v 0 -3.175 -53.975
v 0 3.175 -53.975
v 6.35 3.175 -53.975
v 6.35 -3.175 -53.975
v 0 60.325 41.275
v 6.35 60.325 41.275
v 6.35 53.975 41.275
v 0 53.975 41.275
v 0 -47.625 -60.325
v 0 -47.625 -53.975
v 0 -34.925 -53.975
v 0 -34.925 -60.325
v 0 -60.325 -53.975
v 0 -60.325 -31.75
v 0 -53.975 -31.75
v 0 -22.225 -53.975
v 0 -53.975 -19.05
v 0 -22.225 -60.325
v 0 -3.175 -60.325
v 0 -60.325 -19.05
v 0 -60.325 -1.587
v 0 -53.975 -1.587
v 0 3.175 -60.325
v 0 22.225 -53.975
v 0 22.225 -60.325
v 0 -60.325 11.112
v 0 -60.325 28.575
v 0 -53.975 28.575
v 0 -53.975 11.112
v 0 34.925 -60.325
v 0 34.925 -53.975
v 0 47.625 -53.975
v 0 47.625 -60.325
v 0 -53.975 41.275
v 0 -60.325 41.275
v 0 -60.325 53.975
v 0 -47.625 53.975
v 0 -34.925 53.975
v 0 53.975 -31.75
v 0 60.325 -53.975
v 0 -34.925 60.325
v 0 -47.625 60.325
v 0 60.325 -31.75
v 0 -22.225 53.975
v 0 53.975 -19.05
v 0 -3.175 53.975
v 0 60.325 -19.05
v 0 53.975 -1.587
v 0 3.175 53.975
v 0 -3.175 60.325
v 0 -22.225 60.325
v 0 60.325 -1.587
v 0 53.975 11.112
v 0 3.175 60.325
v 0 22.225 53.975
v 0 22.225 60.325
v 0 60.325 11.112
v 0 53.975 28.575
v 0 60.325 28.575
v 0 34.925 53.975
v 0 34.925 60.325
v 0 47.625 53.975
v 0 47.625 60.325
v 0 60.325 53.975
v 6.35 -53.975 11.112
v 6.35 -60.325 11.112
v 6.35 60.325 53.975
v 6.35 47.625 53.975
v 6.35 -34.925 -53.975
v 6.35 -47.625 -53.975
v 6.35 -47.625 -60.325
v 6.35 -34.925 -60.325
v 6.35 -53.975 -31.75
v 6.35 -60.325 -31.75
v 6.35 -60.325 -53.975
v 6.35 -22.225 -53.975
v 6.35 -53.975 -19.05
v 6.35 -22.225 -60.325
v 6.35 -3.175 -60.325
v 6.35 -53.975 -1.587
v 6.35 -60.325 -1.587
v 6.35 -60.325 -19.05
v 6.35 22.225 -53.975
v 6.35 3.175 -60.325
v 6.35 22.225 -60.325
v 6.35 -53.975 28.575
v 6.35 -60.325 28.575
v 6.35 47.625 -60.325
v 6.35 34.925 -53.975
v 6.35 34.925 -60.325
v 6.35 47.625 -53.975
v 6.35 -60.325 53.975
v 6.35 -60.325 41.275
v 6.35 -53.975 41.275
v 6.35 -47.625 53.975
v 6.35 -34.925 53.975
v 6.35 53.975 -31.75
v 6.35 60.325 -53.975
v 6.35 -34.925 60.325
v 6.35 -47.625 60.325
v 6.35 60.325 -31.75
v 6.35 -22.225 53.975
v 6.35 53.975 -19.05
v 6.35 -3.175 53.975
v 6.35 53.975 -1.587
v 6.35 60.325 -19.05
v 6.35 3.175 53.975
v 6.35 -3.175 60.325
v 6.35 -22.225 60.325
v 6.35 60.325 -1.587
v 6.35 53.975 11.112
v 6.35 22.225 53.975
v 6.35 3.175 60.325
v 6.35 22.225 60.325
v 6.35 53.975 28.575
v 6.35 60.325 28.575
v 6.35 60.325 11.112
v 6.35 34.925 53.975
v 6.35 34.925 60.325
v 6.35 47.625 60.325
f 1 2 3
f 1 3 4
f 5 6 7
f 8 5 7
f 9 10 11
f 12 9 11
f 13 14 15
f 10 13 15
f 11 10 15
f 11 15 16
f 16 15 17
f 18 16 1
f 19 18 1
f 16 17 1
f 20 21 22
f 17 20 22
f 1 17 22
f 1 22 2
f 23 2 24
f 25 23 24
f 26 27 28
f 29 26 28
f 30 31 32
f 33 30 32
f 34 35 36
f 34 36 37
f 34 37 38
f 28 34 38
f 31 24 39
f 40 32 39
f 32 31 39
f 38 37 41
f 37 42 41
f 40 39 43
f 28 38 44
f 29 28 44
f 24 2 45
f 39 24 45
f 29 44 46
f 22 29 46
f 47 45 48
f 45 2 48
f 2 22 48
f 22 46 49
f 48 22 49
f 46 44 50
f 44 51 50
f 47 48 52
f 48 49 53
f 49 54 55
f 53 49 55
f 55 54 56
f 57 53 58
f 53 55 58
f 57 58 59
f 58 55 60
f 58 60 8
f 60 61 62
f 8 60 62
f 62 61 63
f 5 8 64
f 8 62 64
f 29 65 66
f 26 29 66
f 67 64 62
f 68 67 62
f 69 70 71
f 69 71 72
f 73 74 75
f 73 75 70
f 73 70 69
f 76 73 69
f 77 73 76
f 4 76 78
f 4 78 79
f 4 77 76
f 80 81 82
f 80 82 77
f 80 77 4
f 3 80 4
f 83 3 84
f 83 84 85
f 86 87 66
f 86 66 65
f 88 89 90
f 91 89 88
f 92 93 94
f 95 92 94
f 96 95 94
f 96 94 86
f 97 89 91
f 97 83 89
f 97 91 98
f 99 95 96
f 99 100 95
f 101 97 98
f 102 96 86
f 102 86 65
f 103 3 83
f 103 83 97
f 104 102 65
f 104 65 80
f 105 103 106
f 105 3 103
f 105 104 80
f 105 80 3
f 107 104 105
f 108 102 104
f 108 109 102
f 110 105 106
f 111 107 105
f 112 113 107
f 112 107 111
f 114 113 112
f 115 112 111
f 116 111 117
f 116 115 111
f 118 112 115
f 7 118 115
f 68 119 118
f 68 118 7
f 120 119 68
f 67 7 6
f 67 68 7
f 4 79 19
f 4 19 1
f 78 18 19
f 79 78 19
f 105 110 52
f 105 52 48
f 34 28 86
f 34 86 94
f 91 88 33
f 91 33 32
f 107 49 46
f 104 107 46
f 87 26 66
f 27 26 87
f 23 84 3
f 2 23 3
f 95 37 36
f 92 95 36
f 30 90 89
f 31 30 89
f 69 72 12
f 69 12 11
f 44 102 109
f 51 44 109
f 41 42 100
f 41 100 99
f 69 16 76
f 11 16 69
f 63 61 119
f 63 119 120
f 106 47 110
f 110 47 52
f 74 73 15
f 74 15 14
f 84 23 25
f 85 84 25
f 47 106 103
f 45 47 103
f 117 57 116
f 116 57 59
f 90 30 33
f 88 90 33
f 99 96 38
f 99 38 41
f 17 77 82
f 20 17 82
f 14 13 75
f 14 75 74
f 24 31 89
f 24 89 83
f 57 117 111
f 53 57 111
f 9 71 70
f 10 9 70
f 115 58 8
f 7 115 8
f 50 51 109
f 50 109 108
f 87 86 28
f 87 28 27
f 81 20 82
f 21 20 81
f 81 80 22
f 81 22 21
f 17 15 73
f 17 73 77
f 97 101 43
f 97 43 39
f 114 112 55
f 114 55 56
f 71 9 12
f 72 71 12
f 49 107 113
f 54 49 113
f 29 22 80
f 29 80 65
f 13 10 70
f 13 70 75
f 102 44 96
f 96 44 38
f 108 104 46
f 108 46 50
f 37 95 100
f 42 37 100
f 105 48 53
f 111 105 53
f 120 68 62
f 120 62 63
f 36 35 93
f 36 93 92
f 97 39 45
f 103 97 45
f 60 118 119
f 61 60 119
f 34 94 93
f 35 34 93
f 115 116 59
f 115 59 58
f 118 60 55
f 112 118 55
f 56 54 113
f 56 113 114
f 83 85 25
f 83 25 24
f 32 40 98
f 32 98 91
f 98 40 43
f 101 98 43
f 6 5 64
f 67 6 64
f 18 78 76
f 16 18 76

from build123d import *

# Parameters (mm, degrees)
F0_W      = 120.65
F0_H      = 120.65
F1_DEPTH  = 6.35
F2_W      = 12.7
F2_H      = 6.35
F3_DEPTH  = 6.351
F4_W      = 12.7
F4_H      = 6.35
F5_DEPTH  = 6.351
F6_W      = 6.35
F6_H      = 6.35
F7_DEPTH  = 6.351
F8_W      = 12.7
F8_H      = 6.35
F9_DEPTH  = 6.351
F10_W     = 12.7
F10_H     = 6.35
F11_DEPTH = 6.351
F12_W     = 6.35
F12_H     = 12.7
F13_DEPTH = 6.351
F14_W     = 6.35
F14_H     = 12.7
F15_DEPTH = 6.351
F16_W     = 6.35
F16_H     = 12.7
F17_DEPTH = 6.351
F18_W     = 12.7
F18_H     = 6.35
F19_DEPTH = 6.351
F20_W     = 12.7
F20_H     = 6.35
F20_W_2   = 6.35
F21_DEPTH = 6.351
F22_W     = 6.35
F22_H     = 12.7
F23_DEPTH = 6.351
F24_W     = 6.35
F24_H     = 12.7
F25_DEPTH = 6.351


with BuildPart() as f1:
    # F0 (on Right) → F1 (new body)
    with BuildSketch(Plane.YZ):
        Rectangle(F0_W, F0_H)
    extrude(amount=F1_DEPTH)

    # F2 (on face) → F3 (cut, through all)
    with BuildSketch(Plane(origin=(0, 0, 0), x_dir=(0, -1, 0), z_dir=(-1, 0, 0))):
        with Locations((53.975, 57.15)):
            Rectangle(F2_W, F2_H)
    extrude(amount=-F3_DEPTH, mode=Mode.SUBTRACT)

    # F4 (on face) → F5 (cut, through all)
    with BuildSketch(Plane(origin=(0, 0, 0), x_dir=(0, -1, 0), z_dir=(-1, 0, 0))):
        with Locations((28.575, 57.15)):
            Rectangle(F4_W, F4_H)
    extrude(amount=-F5_DEPTH, mode=Mode.SUBTRACT)

    # F6 (on face) → F7 (cut, through all)
    with BuildSketch(Plane(origin=(0, 0, 0), x_dir=(0, -1, 0), z_dir=(-1, 0, 0))):
        with Locations((0, 57.15)):
            Rectangle(F6_W, F6_H)
    extrude(amount=-F7_DEPTH, mode=Mode.SUBTRACT)

    # F8 (on face) → F9 (cut, through all)
    with BuildSketch(Plane(origin=(0, 0, 0), x_dir=(0, -1, 0), z_dir=(-1, 0, 0))):
        with Locations((-53.975, 57.15)):
            Rectangle(F8_W, F8_H)
    extrude(amount=-F9_DEPTH, mode=Mode.SUBTRACT)

    # F10 (on face) → F11 (cut, through all)
    with BuildSketch(Plane(origin=(0, 0, 0), x_dir=(0, -1, 0), z_dir=(-1, 0, 0))):
        with Locations((-28.575, 57.15)):
            Rectangle(F10_W, F10_H)
    extrude(amount=-F11_DEPTH, mode=Mode.SUBTRACT)

    # F12 (on face) → F13 (cut, through all)
    with BuildSketch(Plane(origin=(0, 0, 0), x_dir=(0, -1, 0), z_dir=(-1, 0, 0))):
        with Locations((-57.15, 34.925)):
            Rectangle(F12_W, F12_H)
    extrude(amount=-F13_DEPTH, mode=Mode.SUBTRACT)

    # F14 (on face) → F15 (cut, through all)
    with BuildSketch(Plane(origin=(0, 0, 0), x_dir=(0, -1, 0), z_dir=(-1, 0, 0))):
        with Locations((-57.15, 4.7625)):
            Rectangle(F14_W, F14_H)
    extrude(amount=-F15_DEPTH, mode=Mode.SUBTRACT)

    # F16 (on face) → F17 (cut, through all)
    with BuildSketch(Plane(origin=(0, 0, 0), x_dir=(0, -1, 0), z_dir=(-1, 0, 0))):
        with Locations((-57.15, -25.4)):
            Rectangle(F16_W, F16_H)
    extrude(amount=-F17_DEPTH, mode=Mode.SUBTRACT)

    # F18 (on face) → F19 (cut, through all)
    with BuildSketch(Plane(origin=(0, 0, 0), x_dir=(0, -1, 0), z_dir=(-1, 0, 0))):
        with Locations((-53.975, -57.15)):
            Rectangle(F18_W, F18_H)
        with Locations((53.975, -57.15)):
            Rectangle(F18_W, F18_H)
    extrude(amount=-F19_DEPTH, mode=Mode.SUBTRACT)

    # F20 (on face) → F21 (cut, through all)
    with BuildSketch(Plane(origin=(0, 0, 0), x_dir=(0, -1, 0), z_dir=(-1, 0, 0))):
        with Locations((-28.575, -57.15)):
            Rectangle(F20_W, F20_H)
        with Locations((0, -57.15)):
            Rectangle(F20_W_2, F20_H)
        with Locations((28.575, -57.15)):
            Rectangle(F20_W, F20_H)
    extrude(amount=-F21_DEPTH, mode=Mode.SUBTRACT)

    # F22 (on face) → F23 (cut, through all)
    with BuildSketch(Plane(origin=(0, 0, 0), x_dir=(0, -1, 0), z_dir=(-1, 0, 0))):
        with Locations((57.15, 34.925)):
            Rectangle(F22_W, F22_H)
        with Locations((57.15, 4.7625)):
            Rectangle(F22_W, F22_H)
    extrude(amount=-F23_DEPTH, mode=Mode.SUBTRACT)

    # F24 (on face) → F25 (cut, through all)
    with BuildSketch(Plane(origin=(0, 0, 0), x_dir=(0, -1, 0), z_dir=(-1, 0, 0))):
        with Locations((57.15, -25.4)):
            Rectangle(F24_W, F24_H)
    extrude(amount=-F25_DEPTH, mode=Mode.SUBTRACT)


solid = f1.part
